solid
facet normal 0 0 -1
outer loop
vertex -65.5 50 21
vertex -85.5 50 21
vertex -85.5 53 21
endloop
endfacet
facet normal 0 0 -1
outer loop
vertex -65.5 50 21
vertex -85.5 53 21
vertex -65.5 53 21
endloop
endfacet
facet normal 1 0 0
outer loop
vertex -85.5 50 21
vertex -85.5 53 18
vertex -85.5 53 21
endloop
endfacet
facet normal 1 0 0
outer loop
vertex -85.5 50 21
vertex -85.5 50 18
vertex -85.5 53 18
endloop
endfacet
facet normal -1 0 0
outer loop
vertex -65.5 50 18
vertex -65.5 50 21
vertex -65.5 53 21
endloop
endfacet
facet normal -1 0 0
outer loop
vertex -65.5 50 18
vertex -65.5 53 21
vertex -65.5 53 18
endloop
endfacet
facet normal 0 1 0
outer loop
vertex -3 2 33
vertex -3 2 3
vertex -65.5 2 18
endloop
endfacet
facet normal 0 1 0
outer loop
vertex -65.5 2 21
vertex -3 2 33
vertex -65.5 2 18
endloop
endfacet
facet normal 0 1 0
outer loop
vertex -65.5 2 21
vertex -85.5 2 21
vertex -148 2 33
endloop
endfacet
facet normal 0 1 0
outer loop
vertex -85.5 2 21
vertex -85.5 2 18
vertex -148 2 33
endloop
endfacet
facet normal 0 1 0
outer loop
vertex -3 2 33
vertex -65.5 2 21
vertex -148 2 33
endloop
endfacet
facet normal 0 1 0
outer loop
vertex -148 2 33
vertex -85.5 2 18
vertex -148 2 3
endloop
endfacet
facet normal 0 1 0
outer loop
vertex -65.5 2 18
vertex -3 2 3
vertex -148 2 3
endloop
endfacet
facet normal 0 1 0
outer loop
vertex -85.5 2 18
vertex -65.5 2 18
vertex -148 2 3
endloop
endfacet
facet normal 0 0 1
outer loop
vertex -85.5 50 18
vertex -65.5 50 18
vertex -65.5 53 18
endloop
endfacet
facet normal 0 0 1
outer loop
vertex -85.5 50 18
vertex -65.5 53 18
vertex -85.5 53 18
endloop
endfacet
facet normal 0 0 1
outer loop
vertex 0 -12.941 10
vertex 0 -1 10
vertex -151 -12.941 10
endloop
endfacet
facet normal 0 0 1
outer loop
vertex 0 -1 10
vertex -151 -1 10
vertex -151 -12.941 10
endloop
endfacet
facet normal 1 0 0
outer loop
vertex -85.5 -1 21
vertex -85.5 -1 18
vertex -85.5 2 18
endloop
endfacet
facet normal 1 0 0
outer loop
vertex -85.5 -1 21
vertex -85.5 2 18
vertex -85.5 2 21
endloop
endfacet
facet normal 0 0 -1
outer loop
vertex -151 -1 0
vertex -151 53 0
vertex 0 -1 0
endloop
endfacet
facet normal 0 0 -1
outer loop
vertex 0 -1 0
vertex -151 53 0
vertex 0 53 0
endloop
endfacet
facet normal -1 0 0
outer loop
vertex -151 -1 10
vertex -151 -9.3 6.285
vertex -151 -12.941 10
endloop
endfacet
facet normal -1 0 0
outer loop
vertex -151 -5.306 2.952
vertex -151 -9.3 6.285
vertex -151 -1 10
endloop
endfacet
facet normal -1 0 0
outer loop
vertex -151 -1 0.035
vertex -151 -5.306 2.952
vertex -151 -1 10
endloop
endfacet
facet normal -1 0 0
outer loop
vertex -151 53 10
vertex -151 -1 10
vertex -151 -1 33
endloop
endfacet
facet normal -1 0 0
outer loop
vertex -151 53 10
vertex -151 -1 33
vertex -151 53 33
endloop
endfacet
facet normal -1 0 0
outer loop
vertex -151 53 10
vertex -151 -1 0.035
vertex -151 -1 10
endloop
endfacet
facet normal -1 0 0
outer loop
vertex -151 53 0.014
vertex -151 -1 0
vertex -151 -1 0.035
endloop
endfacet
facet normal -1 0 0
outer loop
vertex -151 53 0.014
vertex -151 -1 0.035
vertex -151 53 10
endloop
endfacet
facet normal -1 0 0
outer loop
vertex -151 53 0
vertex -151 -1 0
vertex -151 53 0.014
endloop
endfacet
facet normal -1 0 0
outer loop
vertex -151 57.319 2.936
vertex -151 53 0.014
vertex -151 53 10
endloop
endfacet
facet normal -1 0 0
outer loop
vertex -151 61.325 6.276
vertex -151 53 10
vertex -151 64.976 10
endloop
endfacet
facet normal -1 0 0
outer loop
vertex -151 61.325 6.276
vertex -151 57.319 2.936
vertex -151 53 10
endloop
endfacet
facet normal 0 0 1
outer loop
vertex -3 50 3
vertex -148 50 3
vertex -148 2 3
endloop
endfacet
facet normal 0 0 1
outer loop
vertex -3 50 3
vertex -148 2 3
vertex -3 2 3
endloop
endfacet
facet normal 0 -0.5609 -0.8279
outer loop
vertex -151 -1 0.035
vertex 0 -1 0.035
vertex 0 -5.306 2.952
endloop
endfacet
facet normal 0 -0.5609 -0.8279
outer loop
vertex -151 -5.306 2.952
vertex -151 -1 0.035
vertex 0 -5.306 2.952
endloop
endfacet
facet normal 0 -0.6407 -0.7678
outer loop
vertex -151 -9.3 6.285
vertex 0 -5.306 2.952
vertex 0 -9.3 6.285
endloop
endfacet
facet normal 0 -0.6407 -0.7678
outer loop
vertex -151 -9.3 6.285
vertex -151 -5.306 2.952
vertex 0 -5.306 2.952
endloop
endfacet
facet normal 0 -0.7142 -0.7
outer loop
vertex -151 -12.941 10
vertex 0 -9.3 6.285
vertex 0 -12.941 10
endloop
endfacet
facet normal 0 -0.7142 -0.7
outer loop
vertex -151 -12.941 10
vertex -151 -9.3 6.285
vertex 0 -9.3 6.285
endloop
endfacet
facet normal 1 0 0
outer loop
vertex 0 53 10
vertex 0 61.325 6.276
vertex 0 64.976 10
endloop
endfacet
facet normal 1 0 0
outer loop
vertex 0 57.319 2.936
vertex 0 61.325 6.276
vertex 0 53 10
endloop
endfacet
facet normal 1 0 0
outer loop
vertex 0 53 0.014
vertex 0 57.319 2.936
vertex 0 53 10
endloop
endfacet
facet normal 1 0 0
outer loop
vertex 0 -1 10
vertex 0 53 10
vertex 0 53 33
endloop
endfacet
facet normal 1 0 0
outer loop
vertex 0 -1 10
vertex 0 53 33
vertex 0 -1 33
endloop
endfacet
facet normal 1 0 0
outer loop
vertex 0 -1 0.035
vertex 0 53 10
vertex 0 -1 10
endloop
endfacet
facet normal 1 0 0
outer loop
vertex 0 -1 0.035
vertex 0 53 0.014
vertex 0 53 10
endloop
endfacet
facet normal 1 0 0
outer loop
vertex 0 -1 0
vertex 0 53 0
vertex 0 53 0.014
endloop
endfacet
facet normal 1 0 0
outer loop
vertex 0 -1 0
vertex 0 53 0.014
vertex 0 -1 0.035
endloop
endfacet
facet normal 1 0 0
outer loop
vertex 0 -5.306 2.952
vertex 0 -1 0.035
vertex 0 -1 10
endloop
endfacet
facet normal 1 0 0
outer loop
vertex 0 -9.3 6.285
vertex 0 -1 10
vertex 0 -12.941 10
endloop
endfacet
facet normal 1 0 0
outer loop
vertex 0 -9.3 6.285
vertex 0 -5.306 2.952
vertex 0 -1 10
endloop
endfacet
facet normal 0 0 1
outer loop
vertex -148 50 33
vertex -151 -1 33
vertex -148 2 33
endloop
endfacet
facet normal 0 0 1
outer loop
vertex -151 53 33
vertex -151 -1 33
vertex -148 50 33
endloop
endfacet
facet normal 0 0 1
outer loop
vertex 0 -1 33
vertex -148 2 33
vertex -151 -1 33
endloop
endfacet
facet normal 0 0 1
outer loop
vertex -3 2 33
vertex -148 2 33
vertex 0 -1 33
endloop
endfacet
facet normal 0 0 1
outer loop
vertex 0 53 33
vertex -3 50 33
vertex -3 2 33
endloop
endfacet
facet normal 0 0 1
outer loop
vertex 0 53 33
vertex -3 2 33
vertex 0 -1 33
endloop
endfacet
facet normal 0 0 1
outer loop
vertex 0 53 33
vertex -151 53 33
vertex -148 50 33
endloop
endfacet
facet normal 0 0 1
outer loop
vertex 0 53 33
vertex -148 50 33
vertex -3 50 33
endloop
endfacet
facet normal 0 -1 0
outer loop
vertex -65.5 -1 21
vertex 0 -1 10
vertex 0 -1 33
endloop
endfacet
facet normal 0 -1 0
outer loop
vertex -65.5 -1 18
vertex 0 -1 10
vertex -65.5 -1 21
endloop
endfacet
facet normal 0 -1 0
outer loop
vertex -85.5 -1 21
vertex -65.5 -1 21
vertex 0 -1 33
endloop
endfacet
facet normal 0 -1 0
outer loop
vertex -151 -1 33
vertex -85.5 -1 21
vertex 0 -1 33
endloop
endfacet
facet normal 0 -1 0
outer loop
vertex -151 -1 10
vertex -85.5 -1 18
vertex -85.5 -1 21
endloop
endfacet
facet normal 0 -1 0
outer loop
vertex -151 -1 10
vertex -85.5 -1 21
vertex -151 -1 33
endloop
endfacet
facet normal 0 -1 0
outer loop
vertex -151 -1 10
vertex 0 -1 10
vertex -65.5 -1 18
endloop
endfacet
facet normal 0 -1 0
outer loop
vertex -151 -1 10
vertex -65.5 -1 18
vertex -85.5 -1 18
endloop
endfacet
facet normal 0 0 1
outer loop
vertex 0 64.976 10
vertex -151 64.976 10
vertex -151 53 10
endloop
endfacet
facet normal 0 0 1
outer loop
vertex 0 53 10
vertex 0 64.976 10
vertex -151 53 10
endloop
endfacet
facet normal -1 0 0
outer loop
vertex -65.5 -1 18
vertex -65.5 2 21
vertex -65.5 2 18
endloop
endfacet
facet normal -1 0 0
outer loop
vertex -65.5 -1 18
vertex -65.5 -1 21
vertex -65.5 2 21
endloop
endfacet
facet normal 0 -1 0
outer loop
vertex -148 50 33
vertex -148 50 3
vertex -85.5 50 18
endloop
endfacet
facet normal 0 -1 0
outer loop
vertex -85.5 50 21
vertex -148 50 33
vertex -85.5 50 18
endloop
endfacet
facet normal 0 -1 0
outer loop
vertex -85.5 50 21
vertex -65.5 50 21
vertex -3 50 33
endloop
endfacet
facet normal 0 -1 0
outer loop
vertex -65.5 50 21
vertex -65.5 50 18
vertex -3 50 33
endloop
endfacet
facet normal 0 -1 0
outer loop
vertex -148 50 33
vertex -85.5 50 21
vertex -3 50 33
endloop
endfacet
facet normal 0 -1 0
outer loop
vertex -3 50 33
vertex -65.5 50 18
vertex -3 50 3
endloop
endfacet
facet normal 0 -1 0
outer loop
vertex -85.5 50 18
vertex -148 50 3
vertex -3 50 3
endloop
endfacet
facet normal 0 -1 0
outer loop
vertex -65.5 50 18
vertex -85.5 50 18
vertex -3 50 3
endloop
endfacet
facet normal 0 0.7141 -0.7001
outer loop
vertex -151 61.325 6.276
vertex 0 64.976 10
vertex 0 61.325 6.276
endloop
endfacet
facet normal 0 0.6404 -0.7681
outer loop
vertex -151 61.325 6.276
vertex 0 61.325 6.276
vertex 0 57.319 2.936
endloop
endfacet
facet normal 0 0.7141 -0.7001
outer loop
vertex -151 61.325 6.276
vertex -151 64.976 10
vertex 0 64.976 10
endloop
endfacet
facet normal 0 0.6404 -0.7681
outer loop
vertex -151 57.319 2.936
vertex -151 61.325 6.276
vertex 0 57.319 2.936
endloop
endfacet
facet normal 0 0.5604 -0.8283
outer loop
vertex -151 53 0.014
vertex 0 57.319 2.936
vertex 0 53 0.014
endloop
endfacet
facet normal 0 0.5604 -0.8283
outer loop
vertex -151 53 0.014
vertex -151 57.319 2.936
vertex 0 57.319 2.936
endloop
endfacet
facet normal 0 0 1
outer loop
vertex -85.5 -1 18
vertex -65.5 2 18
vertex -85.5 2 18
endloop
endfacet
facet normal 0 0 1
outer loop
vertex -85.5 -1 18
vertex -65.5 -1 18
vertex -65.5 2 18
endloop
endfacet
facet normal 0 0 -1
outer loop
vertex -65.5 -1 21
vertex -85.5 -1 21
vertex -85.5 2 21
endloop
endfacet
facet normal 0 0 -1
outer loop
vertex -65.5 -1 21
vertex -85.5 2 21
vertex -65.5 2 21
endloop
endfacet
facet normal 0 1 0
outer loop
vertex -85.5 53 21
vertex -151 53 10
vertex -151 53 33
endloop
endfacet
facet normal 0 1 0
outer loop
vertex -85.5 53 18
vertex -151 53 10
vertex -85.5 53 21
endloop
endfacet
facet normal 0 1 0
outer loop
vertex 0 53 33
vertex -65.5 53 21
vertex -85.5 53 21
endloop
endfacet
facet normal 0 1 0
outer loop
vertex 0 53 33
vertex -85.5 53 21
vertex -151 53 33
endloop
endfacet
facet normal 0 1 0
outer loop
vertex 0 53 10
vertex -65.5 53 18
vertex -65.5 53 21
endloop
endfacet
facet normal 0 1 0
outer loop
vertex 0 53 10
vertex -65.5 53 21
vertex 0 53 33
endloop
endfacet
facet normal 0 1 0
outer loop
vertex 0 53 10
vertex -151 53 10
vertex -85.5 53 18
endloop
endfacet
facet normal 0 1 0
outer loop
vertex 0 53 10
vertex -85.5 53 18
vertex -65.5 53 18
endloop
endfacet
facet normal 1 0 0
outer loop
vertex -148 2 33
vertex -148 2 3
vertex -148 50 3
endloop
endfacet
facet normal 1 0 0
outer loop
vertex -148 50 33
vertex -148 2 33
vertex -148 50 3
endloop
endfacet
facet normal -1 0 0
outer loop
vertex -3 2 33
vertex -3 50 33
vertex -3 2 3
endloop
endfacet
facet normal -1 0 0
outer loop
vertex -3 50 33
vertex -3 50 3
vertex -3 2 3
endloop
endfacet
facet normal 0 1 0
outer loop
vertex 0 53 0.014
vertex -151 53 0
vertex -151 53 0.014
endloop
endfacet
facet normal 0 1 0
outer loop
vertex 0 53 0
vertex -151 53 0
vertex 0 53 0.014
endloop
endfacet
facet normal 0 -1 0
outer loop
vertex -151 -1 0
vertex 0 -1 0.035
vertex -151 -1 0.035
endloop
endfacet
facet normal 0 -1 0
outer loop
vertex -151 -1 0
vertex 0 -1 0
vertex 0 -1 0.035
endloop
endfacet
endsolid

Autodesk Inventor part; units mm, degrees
ref_plane "YZ Plane" through (0, 0, 0) normal (1, 0, 0) x (0, 1, 0)
ref_plane "XZ Plane" through (0, 0, 0) normal (0, 1, 0) x (-1, 0, 0)
ref_plane "XY Plane" through (0, 0, 0) normal (0, 0, 1) x (1, 0, 0)
sketch "Sketch1" plane through (0, 0, 0) normal (0, 0, 1) x (1, 0, 0)
  line L0 (0, 0) -> (-151, 0)
  line L1 (-151, 0) -> (-151, 112)
  line L2 (-151, 112) -> (0, 112)
  line L3 (0, 112) -> (0, 0)
  line L4 (-151, 0) -> (0, 0)
  line L5 (0, 0) -> (0, -1)
  line L6 (0, -1) -> (-151, -1)
  line L7 (-151, -1) -> (-151, 0)
  dimension "d0" = 151
  dimension "d1" = 112
  dimension "d35" = 1
extrude "Extrusion1" add sketch "Sketch1" along normal blind 3
sketch "Sketch2" plane through (0, 0, 3) normal (0, 0, 1) x (1, 0, 0)
  line L0 (-151, 0) -> (0, 0) projected
  line L1 (0, 0) -> (-151, 0)
  line L2 (-151, 0) -> (-151, 53)
  line L3 (-151, 53) -> (0, 53)
  line L4 (0, 53) -> (0, 0)
  line L5 (-148, 50) -> (-3, 50)
  line L6 (-3, 50) -> (-3, 3)
  line L7 (-3, 3) -> (-148, 3)
  line L8 (-148, 3) -> (-148, 50)
  line L9 (-151, -1) -> (0, -1) projected
  line L10 (-151, 112) -> (-151, -1) projected
  line L11 (0, -1) -> (0, 112) projected
  line L12 (-148, 3) -> (-3, 3)
  line L13 (-3, 3) -> (-3, 2)
  line L14 (-3, 2) -> (-148, 2)
  line L15 (-148, 2) -> (-148, 3)
  dimension "d4" = 151
  dimension "d5" = 53
  dimension "d6" = 3
  dimension "d7" = 3
  dimension "d8" = 3
  dimension "d9" = 3
  dimension "d36" = 1
extrude "Extrusion2" add sketch "Sketch2" along normal blind 30
sketch "Sketch3" plane through (0, 0, 3) normal (0, 0, 1) x (1, 0, 0)
  line L0 (-148, 109) -> (-103.5, 109)
  line L1 (-103.5, 109) -> (-103.5, 56)
  line L2 (-103.5, 56) -> (-148, 56)
  line L3 (-148, 56) -> (-148, 109)
  line L4 (-47.5, 109) -> (-3, 109)
  line L5 (-3, 109) -> (-3, 56)
  line L6 (-3, 56) -> (-47.5, 56)
  line L7 (-47.5, 56) -> (-47.5, 109)
  line L8 (0, 112) -> (-151, 112) projected
  line L9 (-151, 112) -> (-151, 53) projected
  line L10 (0, 53) -> (0, 112) projected
  line L11 (-85.5, 100) -> (-65.5, 100)
  line L12 (-65.5, 100) -> (-65.5, 65)
  line L13 (-65.5, 65) -> (-85.5, 65)
  line L14 (-85.5, 65) -> (-85.5, 100)
  line L15 (-62.5, 103) -> (-88.5, 103)
  line L16 (-88.5, 103) -> (-88.5, 62)
  line L17 (-88.5, 62) -> (-62.5, 62)
  line L18 (-62.5, 62) -> (-62.5, 103)
  line L19 (-100.5, 112) -> (-151, 112)
  line L20 (-151, 112) -> (-151, 53)
  line L21 (-151, 53) -> (-100.5, 53)
  line L22 (-100.5, 53) -> (-100.5, 112)
  line L23 (0, 112) -> (-50.5, 112)
  line L24 (-50.5, 112) -> (-50.5, 53)
  line L25 (-50.5, 53) -> (0, 53)
  line L26 (0, 53) -> (0, 112)
  point P0 (0, 0)
  dimension "d12" = 44.5
  dimension "d13" = 53
  dimension "d14" = 44.5
  dimension "d15" = 53
  dimension "d16" = 3
  dimension "d17" = 3
  dimension "d18" = 3
  dimension "d19" = 20
  dimension "d20" = 35
  dimension "d21" = 12
  dimension "d22" = 18
  dimension "d23" = 3
  dimension "d24" = 3
  dimension "d25" = 3
extrude "Extrusion3" add sketch "Sketch3" along normal blind 8
fillet "Fillet1" radius 4 6 edges at (-100.5, 82.5, 3) (-62.5, 82.5, 3) (-50.5, 82.5, 3) (-75.5, 103, 3) (-88.5, 82.5, 3) (-75.5, 62, 3)
sketch "Sketch6" plane through (-151, -1, 0) normal (0, -1, 0) x (1, 0, 0)
  line L0 (65.5, 21) -> (85.5, 21)
  line L1 (85.5, 21) -> (85.5, 18)
  line L2 (85.5, 18) -> (65.5, 18)
  line L3 (65.5, 18) -> (65.5, 21)
  line L4 (0, 0) -> (0, 33) projected
  line L5 (0, 33) -> (151, 33) projected
  point P0 (151, 0)
  dimension "d37" = 20
  dimension "d38" = 3
  dimension "d39" = 65.5
  dimension "d40" = 12
extrude "Extrusion5" cut sketch "Sketch6" against normal up to surface (54 mm away)
sketch "Sketch7" plane through (0, 0, 11) normal (0, 0, 1) x (1, 0, 0)
  line L0 (0, 112) -> (-151, 112) projected
  line L1 (0, 112) -> (-151, 112)
  line L2 (-151, 112) -> (-151, 53)
  line L3 (-151, 53) -> (0, 53)
  line L4 (0, 53) -> (0, 112)
  point P0 (0, 0)
extrude "Extrusion6" cut sketch "Sketch7" against normal up to surface (11 mm away)
sketch "Sketch8" plane through (-151, -1, 0) normal (-1, 0, 0) x (0, 0, 1)
  arc A0 (38.3305, 78.7131) -> (30.8341, -23.2131) centre (44.5445, 27.0173) ccw
  line L0 (10, 65.9756) -> (10, -11.9409)
  line L1 (10, 65.9756) -> (87.9165, 65.9756) construction
  line L2 (0, 54) -> (33, 54) projected
  line L3 (0, 0) -> (33, 0) projected
  point P0 (0, 1)
  point P1 (0.0136, 54)
  point P2 (10, 54)
  point P3 (10, 0)
  point P4 (0.0346, 0)
  dimension "d45" = 90
extrude "Extrusion7" add sketch "Sketch8" against normal up to surface (151 mm away) contours L0 L2 A0 | L3 L0 A0
properties part number "bateria_mocowanie_ramie_robota"
